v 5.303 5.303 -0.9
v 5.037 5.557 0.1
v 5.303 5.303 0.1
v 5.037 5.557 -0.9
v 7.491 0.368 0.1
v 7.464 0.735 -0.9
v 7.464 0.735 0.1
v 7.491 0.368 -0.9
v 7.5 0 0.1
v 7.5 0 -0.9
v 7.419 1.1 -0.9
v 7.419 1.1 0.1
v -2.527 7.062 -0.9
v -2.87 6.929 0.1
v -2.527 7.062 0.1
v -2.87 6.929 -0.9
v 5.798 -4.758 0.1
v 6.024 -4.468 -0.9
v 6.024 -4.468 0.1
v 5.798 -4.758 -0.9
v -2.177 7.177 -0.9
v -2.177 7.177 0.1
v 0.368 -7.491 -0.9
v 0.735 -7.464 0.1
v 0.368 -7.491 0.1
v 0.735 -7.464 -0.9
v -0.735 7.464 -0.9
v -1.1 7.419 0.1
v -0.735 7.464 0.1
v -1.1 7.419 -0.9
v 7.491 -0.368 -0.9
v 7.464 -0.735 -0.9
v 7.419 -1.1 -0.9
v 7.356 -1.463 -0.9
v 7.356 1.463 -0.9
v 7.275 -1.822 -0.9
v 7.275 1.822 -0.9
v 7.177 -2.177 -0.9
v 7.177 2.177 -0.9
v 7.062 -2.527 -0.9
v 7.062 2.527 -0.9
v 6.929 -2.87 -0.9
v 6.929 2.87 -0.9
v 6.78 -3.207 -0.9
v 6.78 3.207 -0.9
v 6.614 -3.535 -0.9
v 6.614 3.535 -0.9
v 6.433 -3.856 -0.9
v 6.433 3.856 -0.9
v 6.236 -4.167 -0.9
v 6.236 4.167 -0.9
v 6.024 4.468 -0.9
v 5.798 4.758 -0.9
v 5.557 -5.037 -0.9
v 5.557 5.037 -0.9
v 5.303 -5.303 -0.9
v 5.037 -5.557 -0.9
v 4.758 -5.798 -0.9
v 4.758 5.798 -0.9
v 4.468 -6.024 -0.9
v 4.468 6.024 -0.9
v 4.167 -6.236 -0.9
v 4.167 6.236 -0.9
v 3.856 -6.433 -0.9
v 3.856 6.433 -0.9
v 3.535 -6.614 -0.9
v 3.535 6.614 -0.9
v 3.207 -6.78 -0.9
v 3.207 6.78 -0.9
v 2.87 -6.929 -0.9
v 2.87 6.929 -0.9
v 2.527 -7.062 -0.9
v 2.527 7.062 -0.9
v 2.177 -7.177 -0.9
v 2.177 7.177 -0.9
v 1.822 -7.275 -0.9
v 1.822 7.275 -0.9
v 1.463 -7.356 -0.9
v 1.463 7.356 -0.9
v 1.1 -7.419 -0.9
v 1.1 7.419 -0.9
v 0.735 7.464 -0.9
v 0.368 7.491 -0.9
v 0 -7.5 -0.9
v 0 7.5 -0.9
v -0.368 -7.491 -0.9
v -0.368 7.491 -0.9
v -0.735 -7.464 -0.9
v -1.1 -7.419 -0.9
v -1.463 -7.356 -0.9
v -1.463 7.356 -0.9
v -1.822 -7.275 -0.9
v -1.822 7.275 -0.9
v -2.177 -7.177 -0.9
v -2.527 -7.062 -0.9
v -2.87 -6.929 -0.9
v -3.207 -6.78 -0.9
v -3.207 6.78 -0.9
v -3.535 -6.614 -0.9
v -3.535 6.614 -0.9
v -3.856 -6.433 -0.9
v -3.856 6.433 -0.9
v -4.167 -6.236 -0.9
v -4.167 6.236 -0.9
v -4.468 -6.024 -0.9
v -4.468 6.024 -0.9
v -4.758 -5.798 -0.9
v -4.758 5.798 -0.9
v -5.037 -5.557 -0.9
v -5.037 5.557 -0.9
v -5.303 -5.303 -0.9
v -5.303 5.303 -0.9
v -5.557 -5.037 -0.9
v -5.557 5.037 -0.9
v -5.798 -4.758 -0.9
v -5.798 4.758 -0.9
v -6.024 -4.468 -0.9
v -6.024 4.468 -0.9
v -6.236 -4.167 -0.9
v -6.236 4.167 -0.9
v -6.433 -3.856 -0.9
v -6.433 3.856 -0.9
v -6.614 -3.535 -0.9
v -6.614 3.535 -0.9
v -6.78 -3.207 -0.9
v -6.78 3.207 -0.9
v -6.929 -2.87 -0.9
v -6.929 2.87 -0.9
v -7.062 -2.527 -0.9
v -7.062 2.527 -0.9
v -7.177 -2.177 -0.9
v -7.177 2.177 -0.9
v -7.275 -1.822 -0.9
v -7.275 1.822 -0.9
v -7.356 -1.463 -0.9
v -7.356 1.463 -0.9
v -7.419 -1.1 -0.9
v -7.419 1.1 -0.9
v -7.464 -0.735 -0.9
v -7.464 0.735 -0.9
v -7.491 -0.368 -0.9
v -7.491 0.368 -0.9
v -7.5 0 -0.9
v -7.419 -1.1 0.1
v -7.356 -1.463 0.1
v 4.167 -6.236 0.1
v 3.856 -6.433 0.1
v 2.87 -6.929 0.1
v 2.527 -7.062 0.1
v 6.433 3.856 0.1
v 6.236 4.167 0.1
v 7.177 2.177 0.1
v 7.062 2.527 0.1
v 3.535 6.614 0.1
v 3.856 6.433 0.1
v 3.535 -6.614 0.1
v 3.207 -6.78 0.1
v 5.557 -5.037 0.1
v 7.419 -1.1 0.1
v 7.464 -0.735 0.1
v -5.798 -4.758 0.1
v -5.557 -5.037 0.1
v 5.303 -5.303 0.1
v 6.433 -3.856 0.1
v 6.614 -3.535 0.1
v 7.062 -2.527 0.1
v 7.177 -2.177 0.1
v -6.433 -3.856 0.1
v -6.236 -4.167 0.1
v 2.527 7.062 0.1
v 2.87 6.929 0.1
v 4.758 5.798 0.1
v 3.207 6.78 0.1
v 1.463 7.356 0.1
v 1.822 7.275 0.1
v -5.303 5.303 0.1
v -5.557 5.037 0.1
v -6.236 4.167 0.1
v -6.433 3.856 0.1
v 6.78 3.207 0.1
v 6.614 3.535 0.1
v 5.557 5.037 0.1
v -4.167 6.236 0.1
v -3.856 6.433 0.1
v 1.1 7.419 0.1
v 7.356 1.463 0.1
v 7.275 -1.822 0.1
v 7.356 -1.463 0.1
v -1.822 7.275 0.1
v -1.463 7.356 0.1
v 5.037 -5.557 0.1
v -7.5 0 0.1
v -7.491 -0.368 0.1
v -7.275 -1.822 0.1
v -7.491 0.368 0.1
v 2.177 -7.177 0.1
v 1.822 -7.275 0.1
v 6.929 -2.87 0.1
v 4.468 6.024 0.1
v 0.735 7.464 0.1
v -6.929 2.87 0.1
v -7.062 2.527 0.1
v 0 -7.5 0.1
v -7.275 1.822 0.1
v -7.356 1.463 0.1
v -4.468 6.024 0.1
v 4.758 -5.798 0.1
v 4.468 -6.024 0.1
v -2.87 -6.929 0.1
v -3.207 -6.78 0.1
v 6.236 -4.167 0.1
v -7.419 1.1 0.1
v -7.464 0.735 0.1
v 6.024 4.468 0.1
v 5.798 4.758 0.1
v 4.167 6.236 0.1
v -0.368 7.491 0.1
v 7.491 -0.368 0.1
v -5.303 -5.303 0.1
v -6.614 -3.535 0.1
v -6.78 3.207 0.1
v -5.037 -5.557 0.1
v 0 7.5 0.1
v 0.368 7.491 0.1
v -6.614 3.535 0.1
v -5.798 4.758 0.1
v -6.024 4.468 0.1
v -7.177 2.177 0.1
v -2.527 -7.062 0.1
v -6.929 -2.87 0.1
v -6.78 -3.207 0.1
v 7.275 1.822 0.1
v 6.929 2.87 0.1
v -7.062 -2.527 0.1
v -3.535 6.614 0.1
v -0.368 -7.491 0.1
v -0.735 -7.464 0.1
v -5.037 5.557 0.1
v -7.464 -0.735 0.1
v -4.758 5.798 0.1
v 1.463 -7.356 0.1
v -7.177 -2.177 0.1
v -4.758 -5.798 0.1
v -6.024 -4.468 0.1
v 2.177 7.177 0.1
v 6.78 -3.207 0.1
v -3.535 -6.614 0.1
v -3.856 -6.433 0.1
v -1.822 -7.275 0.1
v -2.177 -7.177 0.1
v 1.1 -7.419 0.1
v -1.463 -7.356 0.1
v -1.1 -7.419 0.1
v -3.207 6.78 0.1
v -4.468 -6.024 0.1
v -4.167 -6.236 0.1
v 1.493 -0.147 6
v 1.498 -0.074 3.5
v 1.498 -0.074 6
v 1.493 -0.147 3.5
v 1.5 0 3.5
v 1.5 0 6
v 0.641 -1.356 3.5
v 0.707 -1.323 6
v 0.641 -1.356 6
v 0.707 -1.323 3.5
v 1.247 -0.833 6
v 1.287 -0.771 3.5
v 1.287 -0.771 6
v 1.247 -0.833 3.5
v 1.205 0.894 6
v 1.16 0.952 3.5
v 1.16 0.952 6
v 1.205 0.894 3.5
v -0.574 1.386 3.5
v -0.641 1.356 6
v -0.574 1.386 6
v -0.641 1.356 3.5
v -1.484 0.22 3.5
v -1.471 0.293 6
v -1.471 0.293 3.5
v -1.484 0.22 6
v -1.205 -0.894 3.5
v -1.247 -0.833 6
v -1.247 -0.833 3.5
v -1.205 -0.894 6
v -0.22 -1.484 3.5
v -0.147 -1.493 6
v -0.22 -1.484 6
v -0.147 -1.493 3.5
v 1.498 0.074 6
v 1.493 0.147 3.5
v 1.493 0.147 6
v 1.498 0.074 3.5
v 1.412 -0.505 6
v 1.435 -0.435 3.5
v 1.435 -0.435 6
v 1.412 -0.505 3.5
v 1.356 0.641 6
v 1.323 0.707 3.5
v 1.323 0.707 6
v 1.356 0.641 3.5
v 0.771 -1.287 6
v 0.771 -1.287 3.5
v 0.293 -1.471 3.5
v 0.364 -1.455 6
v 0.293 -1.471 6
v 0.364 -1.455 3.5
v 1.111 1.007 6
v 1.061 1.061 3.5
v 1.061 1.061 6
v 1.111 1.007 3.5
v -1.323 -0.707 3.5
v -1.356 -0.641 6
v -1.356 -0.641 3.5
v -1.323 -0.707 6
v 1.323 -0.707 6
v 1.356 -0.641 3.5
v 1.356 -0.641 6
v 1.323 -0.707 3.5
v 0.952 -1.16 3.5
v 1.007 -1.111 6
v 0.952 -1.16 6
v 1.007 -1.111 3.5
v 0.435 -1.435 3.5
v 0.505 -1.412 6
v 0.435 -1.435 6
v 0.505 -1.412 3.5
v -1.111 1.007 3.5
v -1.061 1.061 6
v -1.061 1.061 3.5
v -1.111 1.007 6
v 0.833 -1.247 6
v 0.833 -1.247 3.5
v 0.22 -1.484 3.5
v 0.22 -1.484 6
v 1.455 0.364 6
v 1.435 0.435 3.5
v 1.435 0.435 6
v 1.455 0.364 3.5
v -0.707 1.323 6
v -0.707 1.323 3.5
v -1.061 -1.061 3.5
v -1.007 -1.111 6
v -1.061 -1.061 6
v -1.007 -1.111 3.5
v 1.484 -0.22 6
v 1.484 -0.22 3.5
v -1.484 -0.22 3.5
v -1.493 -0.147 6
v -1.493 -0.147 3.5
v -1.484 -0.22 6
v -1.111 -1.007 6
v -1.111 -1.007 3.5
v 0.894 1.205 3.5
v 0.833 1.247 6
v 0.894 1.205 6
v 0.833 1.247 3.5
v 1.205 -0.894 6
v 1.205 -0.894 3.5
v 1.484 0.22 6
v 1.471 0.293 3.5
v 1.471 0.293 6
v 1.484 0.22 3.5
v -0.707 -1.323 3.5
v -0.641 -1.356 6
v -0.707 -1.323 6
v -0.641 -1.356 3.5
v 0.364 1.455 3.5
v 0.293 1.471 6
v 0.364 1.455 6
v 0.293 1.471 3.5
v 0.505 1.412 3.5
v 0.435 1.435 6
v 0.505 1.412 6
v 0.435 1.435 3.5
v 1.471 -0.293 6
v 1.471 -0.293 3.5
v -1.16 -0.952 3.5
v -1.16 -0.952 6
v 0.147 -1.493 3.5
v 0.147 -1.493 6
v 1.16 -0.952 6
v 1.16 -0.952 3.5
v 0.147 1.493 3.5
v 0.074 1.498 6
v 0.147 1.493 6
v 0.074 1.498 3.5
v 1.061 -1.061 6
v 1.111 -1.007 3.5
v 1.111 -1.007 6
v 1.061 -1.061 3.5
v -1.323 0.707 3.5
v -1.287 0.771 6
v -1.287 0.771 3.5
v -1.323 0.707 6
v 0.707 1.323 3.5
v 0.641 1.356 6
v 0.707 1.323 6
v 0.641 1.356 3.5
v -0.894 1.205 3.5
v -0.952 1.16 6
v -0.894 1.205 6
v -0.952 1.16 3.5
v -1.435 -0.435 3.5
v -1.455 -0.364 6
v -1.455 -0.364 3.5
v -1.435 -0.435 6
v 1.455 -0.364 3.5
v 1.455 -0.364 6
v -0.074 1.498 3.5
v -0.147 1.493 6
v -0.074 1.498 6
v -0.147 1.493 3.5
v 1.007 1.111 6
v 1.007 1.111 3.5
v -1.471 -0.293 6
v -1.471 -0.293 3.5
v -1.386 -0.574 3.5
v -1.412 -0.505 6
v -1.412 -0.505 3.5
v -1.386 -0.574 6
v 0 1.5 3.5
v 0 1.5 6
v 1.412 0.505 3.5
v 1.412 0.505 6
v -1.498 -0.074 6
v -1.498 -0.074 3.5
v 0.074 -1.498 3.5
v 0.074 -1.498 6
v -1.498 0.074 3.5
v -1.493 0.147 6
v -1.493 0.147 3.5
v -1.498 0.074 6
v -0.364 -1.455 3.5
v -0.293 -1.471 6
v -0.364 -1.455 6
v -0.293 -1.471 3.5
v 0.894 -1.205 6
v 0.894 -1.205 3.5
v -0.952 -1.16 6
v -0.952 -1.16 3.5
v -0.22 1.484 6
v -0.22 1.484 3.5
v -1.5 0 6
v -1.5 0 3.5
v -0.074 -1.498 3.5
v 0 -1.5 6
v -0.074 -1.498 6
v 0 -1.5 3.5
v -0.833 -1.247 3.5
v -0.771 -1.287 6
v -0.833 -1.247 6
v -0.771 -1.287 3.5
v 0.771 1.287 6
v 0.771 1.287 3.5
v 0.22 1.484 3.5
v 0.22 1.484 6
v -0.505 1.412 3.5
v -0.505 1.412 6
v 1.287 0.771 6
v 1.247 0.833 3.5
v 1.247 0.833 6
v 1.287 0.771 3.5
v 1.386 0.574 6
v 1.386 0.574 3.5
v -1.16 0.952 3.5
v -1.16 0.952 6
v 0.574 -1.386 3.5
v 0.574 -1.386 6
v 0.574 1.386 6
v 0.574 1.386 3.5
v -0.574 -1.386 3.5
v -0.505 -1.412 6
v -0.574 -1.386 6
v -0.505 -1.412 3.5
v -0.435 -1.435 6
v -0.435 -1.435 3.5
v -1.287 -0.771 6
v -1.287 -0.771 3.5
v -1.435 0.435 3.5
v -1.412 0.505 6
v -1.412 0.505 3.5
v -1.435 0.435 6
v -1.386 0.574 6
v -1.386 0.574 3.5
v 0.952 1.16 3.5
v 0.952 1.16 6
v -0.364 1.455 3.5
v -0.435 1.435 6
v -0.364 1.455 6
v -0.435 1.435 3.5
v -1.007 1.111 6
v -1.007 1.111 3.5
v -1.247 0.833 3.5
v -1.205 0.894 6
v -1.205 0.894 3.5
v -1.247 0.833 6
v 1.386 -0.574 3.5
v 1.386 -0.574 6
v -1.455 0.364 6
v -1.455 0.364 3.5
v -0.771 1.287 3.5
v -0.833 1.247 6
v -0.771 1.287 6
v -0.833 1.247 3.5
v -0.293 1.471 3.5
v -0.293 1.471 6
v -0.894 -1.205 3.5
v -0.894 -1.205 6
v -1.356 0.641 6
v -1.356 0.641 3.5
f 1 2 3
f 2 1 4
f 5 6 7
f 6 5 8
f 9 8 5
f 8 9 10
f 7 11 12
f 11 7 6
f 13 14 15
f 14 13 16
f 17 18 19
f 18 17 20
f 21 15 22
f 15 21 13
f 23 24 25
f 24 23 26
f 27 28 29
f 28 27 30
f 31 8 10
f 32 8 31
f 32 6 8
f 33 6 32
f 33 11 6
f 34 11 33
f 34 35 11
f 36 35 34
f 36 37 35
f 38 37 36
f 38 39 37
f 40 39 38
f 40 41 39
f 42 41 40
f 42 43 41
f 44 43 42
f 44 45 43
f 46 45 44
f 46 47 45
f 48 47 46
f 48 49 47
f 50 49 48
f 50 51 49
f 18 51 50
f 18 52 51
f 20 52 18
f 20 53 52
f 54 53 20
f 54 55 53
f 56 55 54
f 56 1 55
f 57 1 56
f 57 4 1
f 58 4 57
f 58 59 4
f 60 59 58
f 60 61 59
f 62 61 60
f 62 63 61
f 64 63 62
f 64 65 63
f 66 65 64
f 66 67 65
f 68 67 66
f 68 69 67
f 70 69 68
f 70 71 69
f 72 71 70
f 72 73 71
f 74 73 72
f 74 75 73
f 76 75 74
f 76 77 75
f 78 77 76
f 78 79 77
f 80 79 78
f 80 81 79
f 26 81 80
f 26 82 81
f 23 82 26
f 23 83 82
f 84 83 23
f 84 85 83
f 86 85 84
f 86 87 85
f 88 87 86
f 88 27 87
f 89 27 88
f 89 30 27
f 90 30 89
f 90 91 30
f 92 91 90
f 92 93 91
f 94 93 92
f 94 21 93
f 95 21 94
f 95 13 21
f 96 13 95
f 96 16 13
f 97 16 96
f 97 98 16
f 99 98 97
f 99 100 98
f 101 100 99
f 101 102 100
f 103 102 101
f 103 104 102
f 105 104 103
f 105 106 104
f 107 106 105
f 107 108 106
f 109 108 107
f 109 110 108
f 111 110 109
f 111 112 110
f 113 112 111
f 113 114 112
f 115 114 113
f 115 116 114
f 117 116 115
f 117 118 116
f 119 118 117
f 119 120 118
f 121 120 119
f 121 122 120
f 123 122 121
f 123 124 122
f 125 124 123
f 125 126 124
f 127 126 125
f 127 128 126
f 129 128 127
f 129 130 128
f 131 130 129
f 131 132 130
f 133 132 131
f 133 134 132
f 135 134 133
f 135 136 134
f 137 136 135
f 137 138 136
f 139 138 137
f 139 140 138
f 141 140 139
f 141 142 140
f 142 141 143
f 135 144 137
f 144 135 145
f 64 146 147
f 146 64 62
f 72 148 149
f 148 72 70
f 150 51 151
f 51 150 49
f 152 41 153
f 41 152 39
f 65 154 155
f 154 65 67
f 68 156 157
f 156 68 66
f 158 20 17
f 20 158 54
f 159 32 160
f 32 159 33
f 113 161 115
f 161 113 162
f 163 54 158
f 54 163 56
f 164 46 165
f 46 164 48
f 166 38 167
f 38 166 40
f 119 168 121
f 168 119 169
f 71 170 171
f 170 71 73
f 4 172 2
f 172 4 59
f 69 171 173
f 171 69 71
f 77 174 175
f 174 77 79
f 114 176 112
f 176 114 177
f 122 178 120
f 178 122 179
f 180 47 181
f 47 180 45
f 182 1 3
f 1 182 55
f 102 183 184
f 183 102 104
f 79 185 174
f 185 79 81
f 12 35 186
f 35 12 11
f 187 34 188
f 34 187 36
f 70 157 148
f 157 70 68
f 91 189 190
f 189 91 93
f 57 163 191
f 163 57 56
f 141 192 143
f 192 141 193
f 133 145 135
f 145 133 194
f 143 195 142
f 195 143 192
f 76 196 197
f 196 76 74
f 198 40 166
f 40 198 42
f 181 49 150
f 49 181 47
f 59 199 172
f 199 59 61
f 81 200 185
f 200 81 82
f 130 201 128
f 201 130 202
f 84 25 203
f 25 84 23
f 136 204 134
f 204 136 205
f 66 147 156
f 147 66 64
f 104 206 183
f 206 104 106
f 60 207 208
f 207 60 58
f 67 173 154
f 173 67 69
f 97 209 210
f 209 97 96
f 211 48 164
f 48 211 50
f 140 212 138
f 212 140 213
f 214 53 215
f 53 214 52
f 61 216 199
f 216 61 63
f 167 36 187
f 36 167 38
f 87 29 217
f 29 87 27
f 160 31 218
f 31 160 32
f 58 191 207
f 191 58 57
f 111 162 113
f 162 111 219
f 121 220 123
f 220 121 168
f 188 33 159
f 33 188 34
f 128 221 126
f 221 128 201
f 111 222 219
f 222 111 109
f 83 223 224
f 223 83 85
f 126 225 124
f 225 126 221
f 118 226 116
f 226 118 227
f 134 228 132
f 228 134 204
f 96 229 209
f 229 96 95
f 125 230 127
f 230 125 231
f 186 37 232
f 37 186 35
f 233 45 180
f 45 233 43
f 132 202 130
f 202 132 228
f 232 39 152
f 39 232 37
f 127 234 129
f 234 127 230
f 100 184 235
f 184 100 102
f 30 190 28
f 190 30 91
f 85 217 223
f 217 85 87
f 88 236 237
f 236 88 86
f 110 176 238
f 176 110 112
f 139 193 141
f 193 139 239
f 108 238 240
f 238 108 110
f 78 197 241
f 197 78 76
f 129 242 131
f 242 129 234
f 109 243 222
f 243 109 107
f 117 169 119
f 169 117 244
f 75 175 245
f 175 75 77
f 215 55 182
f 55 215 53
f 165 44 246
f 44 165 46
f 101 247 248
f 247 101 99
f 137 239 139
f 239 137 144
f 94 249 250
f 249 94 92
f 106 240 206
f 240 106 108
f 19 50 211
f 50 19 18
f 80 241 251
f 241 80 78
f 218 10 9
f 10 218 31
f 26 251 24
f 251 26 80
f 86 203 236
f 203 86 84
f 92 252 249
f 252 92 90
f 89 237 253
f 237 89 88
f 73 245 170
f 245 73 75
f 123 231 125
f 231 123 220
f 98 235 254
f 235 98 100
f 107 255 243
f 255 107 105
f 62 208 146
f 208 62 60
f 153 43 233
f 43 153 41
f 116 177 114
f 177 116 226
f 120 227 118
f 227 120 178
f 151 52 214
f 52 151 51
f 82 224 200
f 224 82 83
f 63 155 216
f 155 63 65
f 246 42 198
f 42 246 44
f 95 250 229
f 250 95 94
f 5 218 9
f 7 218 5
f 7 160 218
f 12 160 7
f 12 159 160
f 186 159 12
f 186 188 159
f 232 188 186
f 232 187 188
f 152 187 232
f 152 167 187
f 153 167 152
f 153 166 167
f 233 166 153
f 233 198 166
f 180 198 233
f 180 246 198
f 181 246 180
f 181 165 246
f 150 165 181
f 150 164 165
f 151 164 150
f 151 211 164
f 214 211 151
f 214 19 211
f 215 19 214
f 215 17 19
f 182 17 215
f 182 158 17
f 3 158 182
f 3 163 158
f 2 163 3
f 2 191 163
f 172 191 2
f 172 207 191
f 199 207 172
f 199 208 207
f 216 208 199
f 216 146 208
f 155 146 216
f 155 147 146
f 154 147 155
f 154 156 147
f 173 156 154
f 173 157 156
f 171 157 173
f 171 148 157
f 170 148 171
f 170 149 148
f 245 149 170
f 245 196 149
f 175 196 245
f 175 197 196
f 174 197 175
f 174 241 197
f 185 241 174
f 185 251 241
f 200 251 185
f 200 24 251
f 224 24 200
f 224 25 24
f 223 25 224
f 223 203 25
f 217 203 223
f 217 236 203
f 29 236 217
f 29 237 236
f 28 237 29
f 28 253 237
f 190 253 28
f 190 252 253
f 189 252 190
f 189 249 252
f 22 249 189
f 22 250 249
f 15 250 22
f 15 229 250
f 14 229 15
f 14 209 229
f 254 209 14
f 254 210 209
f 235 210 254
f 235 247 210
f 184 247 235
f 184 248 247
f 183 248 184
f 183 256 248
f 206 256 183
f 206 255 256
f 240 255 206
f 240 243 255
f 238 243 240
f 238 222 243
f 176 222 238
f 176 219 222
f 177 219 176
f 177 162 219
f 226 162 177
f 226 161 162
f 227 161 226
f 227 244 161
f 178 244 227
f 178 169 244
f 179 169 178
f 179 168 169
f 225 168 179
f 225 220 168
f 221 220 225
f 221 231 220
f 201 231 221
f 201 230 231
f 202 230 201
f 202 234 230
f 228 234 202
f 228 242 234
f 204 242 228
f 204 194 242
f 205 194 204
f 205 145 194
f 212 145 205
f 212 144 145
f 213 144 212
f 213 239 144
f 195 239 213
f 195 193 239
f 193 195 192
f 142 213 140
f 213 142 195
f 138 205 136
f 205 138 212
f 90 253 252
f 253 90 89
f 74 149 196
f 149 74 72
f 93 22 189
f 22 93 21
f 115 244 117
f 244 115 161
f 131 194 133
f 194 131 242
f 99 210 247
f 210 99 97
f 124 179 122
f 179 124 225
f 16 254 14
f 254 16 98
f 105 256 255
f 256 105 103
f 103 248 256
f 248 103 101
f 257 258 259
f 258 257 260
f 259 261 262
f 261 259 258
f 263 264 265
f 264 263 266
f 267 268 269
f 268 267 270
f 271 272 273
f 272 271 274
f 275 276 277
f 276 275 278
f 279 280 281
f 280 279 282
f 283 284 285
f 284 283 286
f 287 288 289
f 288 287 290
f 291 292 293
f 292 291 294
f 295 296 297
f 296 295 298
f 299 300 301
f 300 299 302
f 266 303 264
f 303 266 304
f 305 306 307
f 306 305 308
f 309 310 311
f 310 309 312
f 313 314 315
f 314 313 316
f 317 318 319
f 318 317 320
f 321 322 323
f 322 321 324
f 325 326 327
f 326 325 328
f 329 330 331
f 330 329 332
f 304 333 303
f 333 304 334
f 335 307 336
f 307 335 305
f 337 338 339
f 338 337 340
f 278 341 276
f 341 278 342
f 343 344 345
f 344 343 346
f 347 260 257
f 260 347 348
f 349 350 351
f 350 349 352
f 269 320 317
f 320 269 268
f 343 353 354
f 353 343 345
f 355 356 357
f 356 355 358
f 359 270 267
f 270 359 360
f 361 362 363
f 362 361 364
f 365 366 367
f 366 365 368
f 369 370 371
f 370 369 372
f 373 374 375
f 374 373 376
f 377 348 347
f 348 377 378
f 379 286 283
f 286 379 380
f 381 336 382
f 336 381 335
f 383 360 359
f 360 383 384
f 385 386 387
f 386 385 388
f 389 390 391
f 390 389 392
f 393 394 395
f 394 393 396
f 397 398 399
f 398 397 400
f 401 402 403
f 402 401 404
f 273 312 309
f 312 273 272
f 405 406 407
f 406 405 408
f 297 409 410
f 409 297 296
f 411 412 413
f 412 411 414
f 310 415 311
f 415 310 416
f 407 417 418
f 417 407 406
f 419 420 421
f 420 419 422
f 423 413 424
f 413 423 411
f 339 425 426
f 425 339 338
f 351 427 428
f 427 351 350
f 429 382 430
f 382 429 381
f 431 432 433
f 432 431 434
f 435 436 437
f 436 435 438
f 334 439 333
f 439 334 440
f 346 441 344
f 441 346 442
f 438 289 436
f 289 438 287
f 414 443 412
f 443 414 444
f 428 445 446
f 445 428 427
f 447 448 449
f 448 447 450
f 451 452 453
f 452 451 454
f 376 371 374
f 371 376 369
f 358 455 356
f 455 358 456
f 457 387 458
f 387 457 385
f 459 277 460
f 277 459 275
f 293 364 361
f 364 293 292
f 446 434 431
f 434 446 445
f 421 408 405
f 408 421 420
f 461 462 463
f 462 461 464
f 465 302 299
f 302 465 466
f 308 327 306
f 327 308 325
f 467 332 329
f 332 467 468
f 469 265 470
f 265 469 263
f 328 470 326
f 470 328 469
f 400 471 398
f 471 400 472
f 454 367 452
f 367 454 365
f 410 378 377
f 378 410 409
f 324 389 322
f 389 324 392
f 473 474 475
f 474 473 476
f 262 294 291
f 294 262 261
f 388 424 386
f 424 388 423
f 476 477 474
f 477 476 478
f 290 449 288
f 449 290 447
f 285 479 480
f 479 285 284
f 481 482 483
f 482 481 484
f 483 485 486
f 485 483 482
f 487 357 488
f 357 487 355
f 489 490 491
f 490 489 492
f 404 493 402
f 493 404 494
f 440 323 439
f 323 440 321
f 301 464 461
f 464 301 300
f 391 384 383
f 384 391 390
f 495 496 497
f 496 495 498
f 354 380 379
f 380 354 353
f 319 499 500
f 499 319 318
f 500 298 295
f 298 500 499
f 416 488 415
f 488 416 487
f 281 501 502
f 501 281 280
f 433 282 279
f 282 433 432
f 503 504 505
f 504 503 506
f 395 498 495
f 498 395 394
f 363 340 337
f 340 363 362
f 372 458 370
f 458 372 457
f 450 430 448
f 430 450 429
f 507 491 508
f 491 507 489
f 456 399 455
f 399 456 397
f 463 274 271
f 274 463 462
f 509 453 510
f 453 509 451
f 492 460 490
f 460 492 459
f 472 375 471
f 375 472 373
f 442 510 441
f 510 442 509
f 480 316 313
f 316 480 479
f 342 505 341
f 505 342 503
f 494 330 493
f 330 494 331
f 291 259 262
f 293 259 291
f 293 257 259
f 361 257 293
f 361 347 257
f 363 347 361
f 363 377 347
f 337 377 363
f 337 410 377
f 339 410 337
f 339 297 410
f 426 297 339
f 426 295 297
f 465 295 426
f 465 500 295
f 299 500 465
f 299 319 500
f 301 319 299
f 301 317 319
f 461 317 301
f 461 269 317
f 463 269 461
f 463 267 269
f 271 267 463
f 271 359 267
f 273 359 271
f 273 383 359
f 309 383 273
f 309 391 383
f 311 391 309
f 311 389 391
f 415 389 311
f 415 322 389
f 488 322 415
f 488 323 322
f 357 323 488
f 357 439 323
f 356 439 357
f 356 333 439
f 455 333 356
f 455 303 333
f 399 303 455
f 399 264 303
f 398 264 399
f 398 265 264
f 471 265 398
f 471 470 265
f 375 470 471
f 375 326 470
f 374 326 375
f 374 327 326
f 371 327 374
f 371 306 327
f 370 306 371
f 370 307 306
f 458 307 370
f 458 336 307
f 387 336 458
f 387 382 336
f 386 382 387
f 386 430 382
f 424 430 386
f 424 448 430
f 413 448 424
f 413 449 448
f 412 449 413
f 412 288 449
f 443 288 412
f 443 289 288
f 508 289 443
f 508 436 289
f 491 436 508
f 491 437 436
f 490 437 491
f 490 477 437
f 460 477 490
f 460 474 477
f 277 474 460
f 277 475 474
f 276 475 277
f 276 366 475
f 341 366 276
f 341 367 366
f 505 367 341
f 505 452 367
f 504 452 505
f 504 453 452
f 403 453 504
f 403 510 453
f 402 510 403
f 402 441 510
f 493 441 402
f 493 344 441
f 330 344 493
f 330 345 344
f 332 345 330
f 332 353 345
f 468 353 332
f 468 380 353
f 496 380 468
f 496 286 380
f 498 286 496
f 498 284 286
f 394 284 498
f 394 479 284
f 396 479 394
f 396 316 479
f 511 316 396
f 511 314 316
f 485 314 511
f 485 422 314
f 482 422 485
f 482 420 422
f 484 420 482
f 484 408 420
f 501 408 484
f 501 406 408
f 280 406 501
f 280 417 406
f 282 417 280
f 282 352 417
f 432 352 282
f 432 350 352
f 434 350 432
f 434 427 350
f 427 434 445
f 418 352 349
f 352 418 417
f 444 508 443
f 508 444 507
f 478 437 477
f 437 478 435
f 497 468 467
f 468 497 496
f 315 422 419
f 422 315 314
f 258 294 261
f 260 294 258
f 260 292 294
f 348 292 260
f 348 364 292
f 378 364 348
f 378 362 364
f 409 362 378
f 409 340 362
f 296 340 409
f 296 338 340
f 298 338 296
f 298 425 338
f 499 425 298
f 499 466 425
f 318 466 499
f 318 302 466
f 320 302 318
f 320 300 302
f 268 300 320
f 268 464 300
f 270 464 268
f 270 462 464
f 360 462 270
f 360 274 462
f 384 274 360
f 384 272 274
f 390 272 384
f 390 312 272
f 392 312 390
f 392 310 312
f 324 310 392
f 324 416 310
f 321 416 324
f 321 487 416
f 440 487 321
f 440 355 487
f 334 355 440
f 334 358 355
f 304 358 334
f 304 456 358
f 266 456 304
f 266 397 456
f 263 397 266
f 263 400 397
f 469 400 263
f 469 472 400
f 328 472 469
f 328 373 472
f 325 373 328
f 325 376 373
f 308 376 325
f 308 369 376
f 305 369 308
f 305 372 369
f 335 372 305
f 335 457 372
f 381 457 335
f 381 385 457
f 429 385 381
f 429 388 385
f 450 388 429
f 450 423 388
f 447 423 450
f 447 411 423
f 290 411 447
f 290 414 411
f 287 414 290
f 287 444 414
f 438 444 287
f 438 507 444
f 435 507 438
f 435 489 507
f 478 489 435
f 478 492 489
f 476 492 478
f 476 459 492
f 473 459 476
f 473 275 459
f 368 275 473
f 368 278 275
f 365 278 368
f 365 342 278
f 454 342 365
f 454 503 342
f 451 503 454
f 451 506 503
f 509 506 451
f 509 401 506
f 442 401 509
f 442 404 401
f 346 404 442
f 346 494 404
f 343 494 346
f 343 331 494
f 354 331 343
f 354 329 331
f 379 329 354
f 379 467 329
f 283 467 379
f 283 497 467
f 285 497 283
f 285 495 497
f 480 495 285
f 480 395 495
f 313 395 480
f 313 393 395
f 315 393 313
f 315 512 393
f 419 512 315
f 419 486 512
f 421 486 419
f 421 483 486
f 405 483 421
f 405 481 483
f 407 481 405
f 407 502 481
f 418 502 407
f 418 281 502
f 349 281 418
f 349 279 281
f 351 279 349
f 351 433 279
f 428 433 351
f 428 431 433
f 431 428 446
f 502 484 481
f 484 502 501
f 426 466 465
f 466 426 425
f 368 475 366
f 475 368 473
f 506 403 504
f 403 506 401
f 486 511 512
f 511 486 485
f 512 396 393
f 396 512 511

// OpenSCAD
// file: grommet.scad
// one "grommet"
//
// 2025-05-29- add retaining clip

e = 0.1;

// gtop_dia1 = 12.72;
// gtop_dia2 = 12.53;
// gtop_hgt = 1.5;

gtop_dia1 = 11.75;
gtop_dia2 = 11.5;
gtop_hgt = 1.5;


//gwall_thk = 0.5;
gwall_thk = 1.0;

// ghole_dia from patch.scad

gbody_dia = ghole_dia+2*gwall_thk;

gheight = 5.0;

garm_wid = 10;

// center "rivet" peg
gpeg_len = 5;

// for McMaster clip 98410A111 (1/8)
groove_wid = 0.012*mm;
groove_dia = 0.117*mm;
groove_offset = 0.75;		/* offset from end of peg */
gpeg_dia = groove_dia + 0.012*mm;

// // for McMaster clip 98410A110 (3/16)
// gpeg_dia = 4.5; // 0.177"
// groove_wid = 0.018*mm;
// groove_dia = 0.168*mm;
// groove_offset = 0.75;		/* offset from end of peg */


// hole for spring?
gcenter_hole = 1.67;

module gbody() {
  cylinder( d1=gtop_dia1, d2=gtop_dia2, h=gtop_hgt);
  translate( [0, 0, -gheight+gtop_hgt])
    cylinder( d=gbody_dia, h=gheight);
}

module grommet() {
  difference() {
    translate( [0, 0, -gtop_hgt])
      gbody();
    translate( [0, 0, -gheight-e])
      cylinder( d=ghole_dia, h=gheight+2*e);
  }
}

module grommet3() {
  for( a=[0:120:240]) {
    rotate( [0, 0, a]) {
      // generate one grommet
      translate( [ring_offset, 0, 0]) grommet();
      // generate body
      // first a cylinder around the spring attach
      translate( [0, 0, -gtop_hgt]) cylinder( h=thick, d=6);
      // then some arbitrary parts to extend support out between the rings
      translate( [1.5, 0, -gtop_hgt])
	   rotate( [0, 0, 60])
	   cube( [5, 3, thick]);
    }
  }
  // fill in the center with a small plug
  translate( [0, 0, -gtop_hgt])
    cylinder( d=2, h=thick);
}

// generate a (positive) groove geometry for a McMaster clip
module clip_groove( dia, wid) {
  difference() {
    cylinder( h=wid, d=dia+3);
    translate( [0, 0, -e])
      cylinder( h=wid+2*e, d=dia);
  }
}

module clip() {
  rotate( [0, 90, 90])
//    import("98410A110_Ring.stl");
       import("98410A111_Ring.stl");       
}

module apeg( p_dia, p_len, g_offset, g_dia, g_wid)
{
     echo("peg(", p_dia, p_len, g_offset, g_dia, g_wid);
     // option: center peg
     difference() {
	  cylinder( d=p_dia, h=p_len);
	  translate( [0, 0, g_offset])
	       clip_groove( g_dia, g_wid);
     }
}

module grommets() {
     grommet3();
     translate( [0, 0, -gpeg_len-gtop_hgt+e]) {
	  apeg(gpeg_dia, gpeg_len, groove_offset, groove_dia, groove_wid);
     }
     // option: loop to hook on spring
     translate( [-0.3, -wire_dia/2, attach_ring_dia/2-attach_wire_dia])
	  spring_attach();
}
// file: springtop.scad
//
// 2/22 - tweaked for strength
//

e = 0.1;
  
ring_dia = 7;
ring_hole = 3.5;

// ring_offset = 7.51;   // for 13mm center-to-center
ring_offset = 6.928;	// for 12mm center-to-center

hub_dia = 6.5;
hub_thk = 1.8;

thick = 1.5;

arm_wid = 5.0;

//for now, fudge these
arm_raise = 6;
arm_angle = 65;

module ring() {
  difference() {
    cylinder( d=ring_dia, h=thick);
    translate( [0, 0, -e])
      cylinder( d=ring_hole, h=thick+2*e);
  }
}

module rings() {
  // 3-way symmetry
  for( a=[0:120:240]) {
    rotate( [0, 0, a]) {
      // generate ring
      translate( [ring_offset, 0, 0]) ring();
      // generate arm, sloping upwards
      elen = sqrt(ring_offset*ring_offset+arm_raise*arm_raise);
      translate( [1, -arm_wid/2, 1.25+arm_raise])
	rotate( [0, arm_angle, 0])
      	cube( [elen-ring_hole/4-ring_hole/2+1, arm_wid, thick]);
    }
  }
}

// hub with spring attach
module hub() {
     cylinder( d=hub_dia, h=hub_thk);
     translate( [0, 0, -attach_ring_dia/3])
	  rotate( [0, 180, 0])
	  spring_attach();
}

module springtop() {
  translate( [0, 0, arm_raise])  hub();
  rings();
}
// file: optode_hollow.scad
//
// draw a hollow optode body with up to 3 slots for flexis
//

e = 0.1;

slot_hgt = 5;
slot_wid = 4;

cap_thk = 2;
cap_rim = 4.5;

body_dia = 10;
body_hgt = 10-cap_thk;

body_opening = 8;		/* cavity diameter for electronics */
body_floor = 3;		/* body floor thickness*/

tail_dia = 7;
tail_hgt = 6;

peg_dia = 3;
peg_hgt = 2.5;

// lg_hgt = 8.25;
lg_hgt = 9.25;
lg_dia = 3.5;			/* light pipe tail diameter */
lg_hol = 0;			/* light pipe hole (0 for none) */

lg_spc = 0;			/* zero for one light pipe */
// lg_spc = 3.2; // (for two light pipes)

module body_shape() {
//     translate( [0, 0, -1])
//	  cylinder( h=2, d1=body_dia-1, d2=body_dia-1);
//	  translate( [0, 0, 1-e]) cylinder( h=body_hgt-1, d=body_dia);
     cylinder( h=body_hgt, d=body_dia);
}

module body( a1, w1, a2, w2, a3, w3) {
     difference() {
	  body_shape();
	  translate( [0, 0, body_floor])
	       cylinder( d=body_opening, h=body_hgt);
	  if( w1 > 0)
	    rotate([ 0, 0, a1])
	    translate( [0, -w1/2, body_hgt-slot_hgt+e])
	      cube( [body_dia+2, w1, slot_hgt]);
	  if( w2 > 0)
	    rotate([ 0, 0, a2])
	    translate( [0, -w2/2, body_hgt-slot_hgt+e])
	      cube( [body_dia+2, w2, slot_hgt]);
	  if( w3 > 0)
	    rotate([ 0, 0, a3])
	    translate( [0, -w3/2, body_hgt-slot_hgt+e])
	      cube( [body_dia+2, w3, slot_hgt]);
	  
     }
}

module tail() {
  cylinder( h=tail_hgt, d=tail_dia);
}

module peg() {
  cylinder( h=peg_hgt, d=peg_dia);
}

module cap() {
     translate( [0, 0, body_hgt]) {
	  peg();
	  translate( [0, 0, -cap_thk+e])
	       cylinder( d=body_dia, h=cap_thk);
	  translate( [0, 0, -cap_thk-cap_rim+e])
	       cylinder( d=body_opening-0.1, h=cap_rim);
     }
}

module lg() {
     cylinder( h=lg_hgt, d=lg_dia);
}

module optode( a1, w1, a2, w2, a3, w3) {
     translate( [0, 0, -cap_thk])
     difference() {
	  union() {
	       body( a1, w1, a2, w2, a3, w3);
	       /// translate( [0, 0, body_hgt]) peg();
	       translate( [0, 0, -tail_hgt]) tail();
	       if( lg_spc) {
		    translate( [-lg_spc/2, 0, -lg_hgt])
			 lg();
		    translate( [lg_spc/2, 0, -lg_hgt])
			 lg();
	       } else {
		    translate( [0, 0, -lg_hgt])
			 lg();
	       }
	  }
	  if( lg_hol) translate( [0, 0, -lg_hgt-e]) cylinder( d=lg_hol, h=30);
     }
}
// file: spring.scad
mm = 25.4;

spring_dia = 0.094*mm;
spring_len = 0.5*mm;
wire_dia = 0.012*mm;

attach_wire_dia = 1.1;
attach_ring_dia = 4.3;

coil_len = spring_len - 2*spring_dia;

module hook() {
  rotate( [90, 0, 0]) {
    translate( [0, 0, -wire_dia/2]) {
      difference() {
	cylinder( h=wire_dia, d=spring_dia);
	translate( [0, 0, -e])
	  cylinder( h=wire_dia+2*e, d=spring_dia-2*wire_dia);
	// make it a hook
	rotate( [0, 0, -90])
	translate( [0, 0, -wire_dia-e])
	  cube( [spring_dia+wire_dia+e, spring_dia+wire_dia+e, wire_dia*2+2*e]);
      }
    }
  }
}

// define a module to create a ring to hook the spring onto
module spring_attach() {
  rotate( [90, 180, 0]) {
    translate( [0, 0, -attach_wire_dia/2]) {
      difference() {
	   union() {
		cylinder( h=attach_wire_dia, d=attach_ring_dia);
		translate( [-attach_ring_dia/2, 0, 0])
		     cube( [attach_ring_dia, attach_ring_dia/2, attach_wire_dia]);
	   }
	translate( [0, 0, -e])
	  cylinder( h=attach_wire_dia+2*e, d=attach_ring_dia-2*attach_wire_dia);
      }
    }
  }
}
  

// spring with hooks
module spring() {
  translate( [0, 0, spring_dia])
    cylinder( h=coil_len, d=spring_dia);
  // generate hooks
  translate( [0, 0, spring_dia/2])
        rotate( [0, -90, 180])
    hook();
  translate( [0, 0, spring_len-spring_dia/2])
    hook();
}
// main file
//
// testing for mcmaster spring clips
//

$fn=128;

// the order of these may be important
include <spring.scad>
// include <optode.scad>
include <optode_hollow.scad>
include <springtop.scad>

// this is OK at 3X scale but not at 1X

ghole_dia = 7.25;
// ghole_dia = 7.5;   // pretty loose fit at 1x with 0.2mm nozzle high res

include <grommet.scad>

// center "rivet" peg
gpeg_len = 6;

// for McMaster clip 98410A110
gpeg_dia = 4.5;
groove_wid = 0.018*mm;
groove_dia = 0.168*mm;
groove_offset = 0.75;		/* offset from end of peg */

base_thk = 1;
base_dia = 15;

translate( [0, 0, -base_thk+e])
cylinder( d=base_dia, h=base_thk);
rotate( [180, 0, 0]) translate( [0, 0, -gpeg_len]) {
     peg(gpeg_dia, gpeg_len, groove_offset, groove_dia, groove_wid);
}
